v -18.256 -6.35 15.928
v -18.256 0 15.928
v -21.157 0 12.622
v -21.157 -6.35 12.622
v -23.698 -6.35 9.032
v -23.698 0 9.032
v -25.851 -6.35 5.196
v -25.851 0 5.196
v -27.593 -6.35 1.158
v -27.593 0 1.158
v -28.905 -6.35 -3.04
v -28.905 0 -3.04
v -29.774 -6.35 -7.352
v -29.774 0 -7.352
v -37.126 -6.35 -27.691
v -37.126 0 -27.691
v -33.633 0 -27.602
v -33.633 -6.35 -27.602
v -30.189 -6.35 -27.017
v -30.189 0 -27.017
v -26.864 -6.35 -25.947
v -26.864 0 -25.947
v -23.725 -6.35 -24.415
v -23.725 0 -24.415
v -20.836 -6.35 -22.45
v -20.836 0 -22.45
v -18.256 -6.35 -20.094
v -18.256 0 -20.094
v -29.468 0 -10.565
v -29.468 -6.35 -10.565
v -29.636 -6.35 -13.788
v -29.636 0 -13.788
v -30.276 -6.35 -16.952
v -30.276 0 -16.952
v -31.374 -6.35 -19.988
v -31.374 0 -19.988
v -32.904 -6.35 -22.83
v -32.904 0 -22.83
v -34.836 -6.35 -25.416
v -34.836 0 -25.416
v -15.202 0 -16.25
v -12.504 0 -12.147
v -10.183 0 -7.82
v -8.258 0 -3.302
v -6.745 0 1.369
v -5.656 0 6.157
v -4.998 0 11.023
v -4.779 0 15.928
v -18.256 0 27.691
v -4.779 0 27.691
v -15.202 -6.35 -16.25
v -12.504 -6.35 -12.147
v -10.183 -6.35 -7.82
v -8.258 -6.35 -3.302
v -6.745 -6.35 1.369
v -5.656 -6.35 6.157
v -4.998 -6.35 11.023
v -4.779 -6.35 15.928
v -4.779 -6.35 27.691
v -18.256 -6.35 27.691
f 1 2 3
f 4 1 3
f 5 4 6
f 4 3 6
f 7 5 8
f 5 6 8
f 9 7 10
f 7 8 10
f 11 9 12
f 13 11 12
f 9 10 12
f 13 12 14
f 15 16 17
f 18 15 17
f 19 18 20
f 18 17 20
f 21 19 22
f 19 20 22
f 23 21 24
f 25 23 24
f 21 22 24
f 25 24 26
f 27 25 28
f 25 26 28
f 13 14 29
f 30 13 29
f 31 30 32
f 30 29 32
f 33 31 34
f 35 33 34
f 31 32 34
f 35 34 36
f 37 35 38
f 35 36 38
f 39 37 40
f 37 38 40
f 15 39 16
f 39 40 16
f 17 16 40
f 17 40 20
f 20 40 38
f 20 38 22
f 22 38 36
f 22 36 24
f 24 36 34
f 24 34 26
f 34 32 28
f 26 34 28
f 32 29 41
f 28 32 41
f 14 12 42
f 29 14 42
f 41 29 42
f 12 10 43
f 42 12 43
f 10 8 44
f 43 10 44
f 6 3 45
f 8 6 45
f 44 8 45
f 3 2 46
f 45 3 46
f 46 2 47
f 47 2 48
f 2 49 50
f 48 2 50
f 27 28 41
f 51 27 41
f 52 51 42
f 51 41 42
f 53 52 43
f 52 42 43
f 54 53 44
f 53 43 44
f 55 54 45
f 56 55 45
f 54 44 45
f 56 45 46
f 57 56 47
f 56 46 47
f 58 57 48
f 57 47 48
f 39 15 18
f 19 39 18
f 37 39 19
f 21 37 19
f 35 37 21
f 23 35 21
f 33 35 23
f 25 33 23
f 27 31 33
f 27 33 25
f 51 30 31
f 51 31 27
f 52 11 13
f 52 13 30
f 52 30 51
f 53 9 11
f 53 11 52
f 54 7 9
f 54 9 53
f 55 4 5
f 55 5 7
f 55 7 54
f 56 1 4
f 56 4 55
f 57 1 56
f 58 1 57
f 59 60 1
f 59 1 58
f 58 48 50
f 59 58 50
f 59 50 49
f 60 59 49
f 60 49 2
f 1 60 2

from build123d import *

# Parameters (mm, degrees)
F1_DEPTH = 6.35


with BuildPart() as f1:
    # F0 (on Front) → F1 (new body)
    with BuildSketch(Plane.XZ):
        with BuildLine():
            Line((-4.778545, 27.691057), (-18.256493, 27.691057))
            Line((-18.256493, 27.691057), (-18.256493, 15.928484))
            ThreePointArc((-18.256493, 15.928484), (-25.850649, 5.196476), (-29.774012, -7.351608))
            ThreePointArc((-29.774012, -7.351608), (-30.768982, -18.490309), (-37.125621, -27.691057))
            ThreePointArc((-37.125621, -27.691057), (-26.863912, -25.947249), (-18.256493, -20.094397))
            ThreePointArc((-18.256493, -20.094397), (-8.258358, -3.30237), (-4.778545, 15.928484))
            Line((-4.778545, 15.928484), (-4.778545, 27.691057))
        make_face()
    extrude(amount=F1_DEPTH)


solid = f1.part
